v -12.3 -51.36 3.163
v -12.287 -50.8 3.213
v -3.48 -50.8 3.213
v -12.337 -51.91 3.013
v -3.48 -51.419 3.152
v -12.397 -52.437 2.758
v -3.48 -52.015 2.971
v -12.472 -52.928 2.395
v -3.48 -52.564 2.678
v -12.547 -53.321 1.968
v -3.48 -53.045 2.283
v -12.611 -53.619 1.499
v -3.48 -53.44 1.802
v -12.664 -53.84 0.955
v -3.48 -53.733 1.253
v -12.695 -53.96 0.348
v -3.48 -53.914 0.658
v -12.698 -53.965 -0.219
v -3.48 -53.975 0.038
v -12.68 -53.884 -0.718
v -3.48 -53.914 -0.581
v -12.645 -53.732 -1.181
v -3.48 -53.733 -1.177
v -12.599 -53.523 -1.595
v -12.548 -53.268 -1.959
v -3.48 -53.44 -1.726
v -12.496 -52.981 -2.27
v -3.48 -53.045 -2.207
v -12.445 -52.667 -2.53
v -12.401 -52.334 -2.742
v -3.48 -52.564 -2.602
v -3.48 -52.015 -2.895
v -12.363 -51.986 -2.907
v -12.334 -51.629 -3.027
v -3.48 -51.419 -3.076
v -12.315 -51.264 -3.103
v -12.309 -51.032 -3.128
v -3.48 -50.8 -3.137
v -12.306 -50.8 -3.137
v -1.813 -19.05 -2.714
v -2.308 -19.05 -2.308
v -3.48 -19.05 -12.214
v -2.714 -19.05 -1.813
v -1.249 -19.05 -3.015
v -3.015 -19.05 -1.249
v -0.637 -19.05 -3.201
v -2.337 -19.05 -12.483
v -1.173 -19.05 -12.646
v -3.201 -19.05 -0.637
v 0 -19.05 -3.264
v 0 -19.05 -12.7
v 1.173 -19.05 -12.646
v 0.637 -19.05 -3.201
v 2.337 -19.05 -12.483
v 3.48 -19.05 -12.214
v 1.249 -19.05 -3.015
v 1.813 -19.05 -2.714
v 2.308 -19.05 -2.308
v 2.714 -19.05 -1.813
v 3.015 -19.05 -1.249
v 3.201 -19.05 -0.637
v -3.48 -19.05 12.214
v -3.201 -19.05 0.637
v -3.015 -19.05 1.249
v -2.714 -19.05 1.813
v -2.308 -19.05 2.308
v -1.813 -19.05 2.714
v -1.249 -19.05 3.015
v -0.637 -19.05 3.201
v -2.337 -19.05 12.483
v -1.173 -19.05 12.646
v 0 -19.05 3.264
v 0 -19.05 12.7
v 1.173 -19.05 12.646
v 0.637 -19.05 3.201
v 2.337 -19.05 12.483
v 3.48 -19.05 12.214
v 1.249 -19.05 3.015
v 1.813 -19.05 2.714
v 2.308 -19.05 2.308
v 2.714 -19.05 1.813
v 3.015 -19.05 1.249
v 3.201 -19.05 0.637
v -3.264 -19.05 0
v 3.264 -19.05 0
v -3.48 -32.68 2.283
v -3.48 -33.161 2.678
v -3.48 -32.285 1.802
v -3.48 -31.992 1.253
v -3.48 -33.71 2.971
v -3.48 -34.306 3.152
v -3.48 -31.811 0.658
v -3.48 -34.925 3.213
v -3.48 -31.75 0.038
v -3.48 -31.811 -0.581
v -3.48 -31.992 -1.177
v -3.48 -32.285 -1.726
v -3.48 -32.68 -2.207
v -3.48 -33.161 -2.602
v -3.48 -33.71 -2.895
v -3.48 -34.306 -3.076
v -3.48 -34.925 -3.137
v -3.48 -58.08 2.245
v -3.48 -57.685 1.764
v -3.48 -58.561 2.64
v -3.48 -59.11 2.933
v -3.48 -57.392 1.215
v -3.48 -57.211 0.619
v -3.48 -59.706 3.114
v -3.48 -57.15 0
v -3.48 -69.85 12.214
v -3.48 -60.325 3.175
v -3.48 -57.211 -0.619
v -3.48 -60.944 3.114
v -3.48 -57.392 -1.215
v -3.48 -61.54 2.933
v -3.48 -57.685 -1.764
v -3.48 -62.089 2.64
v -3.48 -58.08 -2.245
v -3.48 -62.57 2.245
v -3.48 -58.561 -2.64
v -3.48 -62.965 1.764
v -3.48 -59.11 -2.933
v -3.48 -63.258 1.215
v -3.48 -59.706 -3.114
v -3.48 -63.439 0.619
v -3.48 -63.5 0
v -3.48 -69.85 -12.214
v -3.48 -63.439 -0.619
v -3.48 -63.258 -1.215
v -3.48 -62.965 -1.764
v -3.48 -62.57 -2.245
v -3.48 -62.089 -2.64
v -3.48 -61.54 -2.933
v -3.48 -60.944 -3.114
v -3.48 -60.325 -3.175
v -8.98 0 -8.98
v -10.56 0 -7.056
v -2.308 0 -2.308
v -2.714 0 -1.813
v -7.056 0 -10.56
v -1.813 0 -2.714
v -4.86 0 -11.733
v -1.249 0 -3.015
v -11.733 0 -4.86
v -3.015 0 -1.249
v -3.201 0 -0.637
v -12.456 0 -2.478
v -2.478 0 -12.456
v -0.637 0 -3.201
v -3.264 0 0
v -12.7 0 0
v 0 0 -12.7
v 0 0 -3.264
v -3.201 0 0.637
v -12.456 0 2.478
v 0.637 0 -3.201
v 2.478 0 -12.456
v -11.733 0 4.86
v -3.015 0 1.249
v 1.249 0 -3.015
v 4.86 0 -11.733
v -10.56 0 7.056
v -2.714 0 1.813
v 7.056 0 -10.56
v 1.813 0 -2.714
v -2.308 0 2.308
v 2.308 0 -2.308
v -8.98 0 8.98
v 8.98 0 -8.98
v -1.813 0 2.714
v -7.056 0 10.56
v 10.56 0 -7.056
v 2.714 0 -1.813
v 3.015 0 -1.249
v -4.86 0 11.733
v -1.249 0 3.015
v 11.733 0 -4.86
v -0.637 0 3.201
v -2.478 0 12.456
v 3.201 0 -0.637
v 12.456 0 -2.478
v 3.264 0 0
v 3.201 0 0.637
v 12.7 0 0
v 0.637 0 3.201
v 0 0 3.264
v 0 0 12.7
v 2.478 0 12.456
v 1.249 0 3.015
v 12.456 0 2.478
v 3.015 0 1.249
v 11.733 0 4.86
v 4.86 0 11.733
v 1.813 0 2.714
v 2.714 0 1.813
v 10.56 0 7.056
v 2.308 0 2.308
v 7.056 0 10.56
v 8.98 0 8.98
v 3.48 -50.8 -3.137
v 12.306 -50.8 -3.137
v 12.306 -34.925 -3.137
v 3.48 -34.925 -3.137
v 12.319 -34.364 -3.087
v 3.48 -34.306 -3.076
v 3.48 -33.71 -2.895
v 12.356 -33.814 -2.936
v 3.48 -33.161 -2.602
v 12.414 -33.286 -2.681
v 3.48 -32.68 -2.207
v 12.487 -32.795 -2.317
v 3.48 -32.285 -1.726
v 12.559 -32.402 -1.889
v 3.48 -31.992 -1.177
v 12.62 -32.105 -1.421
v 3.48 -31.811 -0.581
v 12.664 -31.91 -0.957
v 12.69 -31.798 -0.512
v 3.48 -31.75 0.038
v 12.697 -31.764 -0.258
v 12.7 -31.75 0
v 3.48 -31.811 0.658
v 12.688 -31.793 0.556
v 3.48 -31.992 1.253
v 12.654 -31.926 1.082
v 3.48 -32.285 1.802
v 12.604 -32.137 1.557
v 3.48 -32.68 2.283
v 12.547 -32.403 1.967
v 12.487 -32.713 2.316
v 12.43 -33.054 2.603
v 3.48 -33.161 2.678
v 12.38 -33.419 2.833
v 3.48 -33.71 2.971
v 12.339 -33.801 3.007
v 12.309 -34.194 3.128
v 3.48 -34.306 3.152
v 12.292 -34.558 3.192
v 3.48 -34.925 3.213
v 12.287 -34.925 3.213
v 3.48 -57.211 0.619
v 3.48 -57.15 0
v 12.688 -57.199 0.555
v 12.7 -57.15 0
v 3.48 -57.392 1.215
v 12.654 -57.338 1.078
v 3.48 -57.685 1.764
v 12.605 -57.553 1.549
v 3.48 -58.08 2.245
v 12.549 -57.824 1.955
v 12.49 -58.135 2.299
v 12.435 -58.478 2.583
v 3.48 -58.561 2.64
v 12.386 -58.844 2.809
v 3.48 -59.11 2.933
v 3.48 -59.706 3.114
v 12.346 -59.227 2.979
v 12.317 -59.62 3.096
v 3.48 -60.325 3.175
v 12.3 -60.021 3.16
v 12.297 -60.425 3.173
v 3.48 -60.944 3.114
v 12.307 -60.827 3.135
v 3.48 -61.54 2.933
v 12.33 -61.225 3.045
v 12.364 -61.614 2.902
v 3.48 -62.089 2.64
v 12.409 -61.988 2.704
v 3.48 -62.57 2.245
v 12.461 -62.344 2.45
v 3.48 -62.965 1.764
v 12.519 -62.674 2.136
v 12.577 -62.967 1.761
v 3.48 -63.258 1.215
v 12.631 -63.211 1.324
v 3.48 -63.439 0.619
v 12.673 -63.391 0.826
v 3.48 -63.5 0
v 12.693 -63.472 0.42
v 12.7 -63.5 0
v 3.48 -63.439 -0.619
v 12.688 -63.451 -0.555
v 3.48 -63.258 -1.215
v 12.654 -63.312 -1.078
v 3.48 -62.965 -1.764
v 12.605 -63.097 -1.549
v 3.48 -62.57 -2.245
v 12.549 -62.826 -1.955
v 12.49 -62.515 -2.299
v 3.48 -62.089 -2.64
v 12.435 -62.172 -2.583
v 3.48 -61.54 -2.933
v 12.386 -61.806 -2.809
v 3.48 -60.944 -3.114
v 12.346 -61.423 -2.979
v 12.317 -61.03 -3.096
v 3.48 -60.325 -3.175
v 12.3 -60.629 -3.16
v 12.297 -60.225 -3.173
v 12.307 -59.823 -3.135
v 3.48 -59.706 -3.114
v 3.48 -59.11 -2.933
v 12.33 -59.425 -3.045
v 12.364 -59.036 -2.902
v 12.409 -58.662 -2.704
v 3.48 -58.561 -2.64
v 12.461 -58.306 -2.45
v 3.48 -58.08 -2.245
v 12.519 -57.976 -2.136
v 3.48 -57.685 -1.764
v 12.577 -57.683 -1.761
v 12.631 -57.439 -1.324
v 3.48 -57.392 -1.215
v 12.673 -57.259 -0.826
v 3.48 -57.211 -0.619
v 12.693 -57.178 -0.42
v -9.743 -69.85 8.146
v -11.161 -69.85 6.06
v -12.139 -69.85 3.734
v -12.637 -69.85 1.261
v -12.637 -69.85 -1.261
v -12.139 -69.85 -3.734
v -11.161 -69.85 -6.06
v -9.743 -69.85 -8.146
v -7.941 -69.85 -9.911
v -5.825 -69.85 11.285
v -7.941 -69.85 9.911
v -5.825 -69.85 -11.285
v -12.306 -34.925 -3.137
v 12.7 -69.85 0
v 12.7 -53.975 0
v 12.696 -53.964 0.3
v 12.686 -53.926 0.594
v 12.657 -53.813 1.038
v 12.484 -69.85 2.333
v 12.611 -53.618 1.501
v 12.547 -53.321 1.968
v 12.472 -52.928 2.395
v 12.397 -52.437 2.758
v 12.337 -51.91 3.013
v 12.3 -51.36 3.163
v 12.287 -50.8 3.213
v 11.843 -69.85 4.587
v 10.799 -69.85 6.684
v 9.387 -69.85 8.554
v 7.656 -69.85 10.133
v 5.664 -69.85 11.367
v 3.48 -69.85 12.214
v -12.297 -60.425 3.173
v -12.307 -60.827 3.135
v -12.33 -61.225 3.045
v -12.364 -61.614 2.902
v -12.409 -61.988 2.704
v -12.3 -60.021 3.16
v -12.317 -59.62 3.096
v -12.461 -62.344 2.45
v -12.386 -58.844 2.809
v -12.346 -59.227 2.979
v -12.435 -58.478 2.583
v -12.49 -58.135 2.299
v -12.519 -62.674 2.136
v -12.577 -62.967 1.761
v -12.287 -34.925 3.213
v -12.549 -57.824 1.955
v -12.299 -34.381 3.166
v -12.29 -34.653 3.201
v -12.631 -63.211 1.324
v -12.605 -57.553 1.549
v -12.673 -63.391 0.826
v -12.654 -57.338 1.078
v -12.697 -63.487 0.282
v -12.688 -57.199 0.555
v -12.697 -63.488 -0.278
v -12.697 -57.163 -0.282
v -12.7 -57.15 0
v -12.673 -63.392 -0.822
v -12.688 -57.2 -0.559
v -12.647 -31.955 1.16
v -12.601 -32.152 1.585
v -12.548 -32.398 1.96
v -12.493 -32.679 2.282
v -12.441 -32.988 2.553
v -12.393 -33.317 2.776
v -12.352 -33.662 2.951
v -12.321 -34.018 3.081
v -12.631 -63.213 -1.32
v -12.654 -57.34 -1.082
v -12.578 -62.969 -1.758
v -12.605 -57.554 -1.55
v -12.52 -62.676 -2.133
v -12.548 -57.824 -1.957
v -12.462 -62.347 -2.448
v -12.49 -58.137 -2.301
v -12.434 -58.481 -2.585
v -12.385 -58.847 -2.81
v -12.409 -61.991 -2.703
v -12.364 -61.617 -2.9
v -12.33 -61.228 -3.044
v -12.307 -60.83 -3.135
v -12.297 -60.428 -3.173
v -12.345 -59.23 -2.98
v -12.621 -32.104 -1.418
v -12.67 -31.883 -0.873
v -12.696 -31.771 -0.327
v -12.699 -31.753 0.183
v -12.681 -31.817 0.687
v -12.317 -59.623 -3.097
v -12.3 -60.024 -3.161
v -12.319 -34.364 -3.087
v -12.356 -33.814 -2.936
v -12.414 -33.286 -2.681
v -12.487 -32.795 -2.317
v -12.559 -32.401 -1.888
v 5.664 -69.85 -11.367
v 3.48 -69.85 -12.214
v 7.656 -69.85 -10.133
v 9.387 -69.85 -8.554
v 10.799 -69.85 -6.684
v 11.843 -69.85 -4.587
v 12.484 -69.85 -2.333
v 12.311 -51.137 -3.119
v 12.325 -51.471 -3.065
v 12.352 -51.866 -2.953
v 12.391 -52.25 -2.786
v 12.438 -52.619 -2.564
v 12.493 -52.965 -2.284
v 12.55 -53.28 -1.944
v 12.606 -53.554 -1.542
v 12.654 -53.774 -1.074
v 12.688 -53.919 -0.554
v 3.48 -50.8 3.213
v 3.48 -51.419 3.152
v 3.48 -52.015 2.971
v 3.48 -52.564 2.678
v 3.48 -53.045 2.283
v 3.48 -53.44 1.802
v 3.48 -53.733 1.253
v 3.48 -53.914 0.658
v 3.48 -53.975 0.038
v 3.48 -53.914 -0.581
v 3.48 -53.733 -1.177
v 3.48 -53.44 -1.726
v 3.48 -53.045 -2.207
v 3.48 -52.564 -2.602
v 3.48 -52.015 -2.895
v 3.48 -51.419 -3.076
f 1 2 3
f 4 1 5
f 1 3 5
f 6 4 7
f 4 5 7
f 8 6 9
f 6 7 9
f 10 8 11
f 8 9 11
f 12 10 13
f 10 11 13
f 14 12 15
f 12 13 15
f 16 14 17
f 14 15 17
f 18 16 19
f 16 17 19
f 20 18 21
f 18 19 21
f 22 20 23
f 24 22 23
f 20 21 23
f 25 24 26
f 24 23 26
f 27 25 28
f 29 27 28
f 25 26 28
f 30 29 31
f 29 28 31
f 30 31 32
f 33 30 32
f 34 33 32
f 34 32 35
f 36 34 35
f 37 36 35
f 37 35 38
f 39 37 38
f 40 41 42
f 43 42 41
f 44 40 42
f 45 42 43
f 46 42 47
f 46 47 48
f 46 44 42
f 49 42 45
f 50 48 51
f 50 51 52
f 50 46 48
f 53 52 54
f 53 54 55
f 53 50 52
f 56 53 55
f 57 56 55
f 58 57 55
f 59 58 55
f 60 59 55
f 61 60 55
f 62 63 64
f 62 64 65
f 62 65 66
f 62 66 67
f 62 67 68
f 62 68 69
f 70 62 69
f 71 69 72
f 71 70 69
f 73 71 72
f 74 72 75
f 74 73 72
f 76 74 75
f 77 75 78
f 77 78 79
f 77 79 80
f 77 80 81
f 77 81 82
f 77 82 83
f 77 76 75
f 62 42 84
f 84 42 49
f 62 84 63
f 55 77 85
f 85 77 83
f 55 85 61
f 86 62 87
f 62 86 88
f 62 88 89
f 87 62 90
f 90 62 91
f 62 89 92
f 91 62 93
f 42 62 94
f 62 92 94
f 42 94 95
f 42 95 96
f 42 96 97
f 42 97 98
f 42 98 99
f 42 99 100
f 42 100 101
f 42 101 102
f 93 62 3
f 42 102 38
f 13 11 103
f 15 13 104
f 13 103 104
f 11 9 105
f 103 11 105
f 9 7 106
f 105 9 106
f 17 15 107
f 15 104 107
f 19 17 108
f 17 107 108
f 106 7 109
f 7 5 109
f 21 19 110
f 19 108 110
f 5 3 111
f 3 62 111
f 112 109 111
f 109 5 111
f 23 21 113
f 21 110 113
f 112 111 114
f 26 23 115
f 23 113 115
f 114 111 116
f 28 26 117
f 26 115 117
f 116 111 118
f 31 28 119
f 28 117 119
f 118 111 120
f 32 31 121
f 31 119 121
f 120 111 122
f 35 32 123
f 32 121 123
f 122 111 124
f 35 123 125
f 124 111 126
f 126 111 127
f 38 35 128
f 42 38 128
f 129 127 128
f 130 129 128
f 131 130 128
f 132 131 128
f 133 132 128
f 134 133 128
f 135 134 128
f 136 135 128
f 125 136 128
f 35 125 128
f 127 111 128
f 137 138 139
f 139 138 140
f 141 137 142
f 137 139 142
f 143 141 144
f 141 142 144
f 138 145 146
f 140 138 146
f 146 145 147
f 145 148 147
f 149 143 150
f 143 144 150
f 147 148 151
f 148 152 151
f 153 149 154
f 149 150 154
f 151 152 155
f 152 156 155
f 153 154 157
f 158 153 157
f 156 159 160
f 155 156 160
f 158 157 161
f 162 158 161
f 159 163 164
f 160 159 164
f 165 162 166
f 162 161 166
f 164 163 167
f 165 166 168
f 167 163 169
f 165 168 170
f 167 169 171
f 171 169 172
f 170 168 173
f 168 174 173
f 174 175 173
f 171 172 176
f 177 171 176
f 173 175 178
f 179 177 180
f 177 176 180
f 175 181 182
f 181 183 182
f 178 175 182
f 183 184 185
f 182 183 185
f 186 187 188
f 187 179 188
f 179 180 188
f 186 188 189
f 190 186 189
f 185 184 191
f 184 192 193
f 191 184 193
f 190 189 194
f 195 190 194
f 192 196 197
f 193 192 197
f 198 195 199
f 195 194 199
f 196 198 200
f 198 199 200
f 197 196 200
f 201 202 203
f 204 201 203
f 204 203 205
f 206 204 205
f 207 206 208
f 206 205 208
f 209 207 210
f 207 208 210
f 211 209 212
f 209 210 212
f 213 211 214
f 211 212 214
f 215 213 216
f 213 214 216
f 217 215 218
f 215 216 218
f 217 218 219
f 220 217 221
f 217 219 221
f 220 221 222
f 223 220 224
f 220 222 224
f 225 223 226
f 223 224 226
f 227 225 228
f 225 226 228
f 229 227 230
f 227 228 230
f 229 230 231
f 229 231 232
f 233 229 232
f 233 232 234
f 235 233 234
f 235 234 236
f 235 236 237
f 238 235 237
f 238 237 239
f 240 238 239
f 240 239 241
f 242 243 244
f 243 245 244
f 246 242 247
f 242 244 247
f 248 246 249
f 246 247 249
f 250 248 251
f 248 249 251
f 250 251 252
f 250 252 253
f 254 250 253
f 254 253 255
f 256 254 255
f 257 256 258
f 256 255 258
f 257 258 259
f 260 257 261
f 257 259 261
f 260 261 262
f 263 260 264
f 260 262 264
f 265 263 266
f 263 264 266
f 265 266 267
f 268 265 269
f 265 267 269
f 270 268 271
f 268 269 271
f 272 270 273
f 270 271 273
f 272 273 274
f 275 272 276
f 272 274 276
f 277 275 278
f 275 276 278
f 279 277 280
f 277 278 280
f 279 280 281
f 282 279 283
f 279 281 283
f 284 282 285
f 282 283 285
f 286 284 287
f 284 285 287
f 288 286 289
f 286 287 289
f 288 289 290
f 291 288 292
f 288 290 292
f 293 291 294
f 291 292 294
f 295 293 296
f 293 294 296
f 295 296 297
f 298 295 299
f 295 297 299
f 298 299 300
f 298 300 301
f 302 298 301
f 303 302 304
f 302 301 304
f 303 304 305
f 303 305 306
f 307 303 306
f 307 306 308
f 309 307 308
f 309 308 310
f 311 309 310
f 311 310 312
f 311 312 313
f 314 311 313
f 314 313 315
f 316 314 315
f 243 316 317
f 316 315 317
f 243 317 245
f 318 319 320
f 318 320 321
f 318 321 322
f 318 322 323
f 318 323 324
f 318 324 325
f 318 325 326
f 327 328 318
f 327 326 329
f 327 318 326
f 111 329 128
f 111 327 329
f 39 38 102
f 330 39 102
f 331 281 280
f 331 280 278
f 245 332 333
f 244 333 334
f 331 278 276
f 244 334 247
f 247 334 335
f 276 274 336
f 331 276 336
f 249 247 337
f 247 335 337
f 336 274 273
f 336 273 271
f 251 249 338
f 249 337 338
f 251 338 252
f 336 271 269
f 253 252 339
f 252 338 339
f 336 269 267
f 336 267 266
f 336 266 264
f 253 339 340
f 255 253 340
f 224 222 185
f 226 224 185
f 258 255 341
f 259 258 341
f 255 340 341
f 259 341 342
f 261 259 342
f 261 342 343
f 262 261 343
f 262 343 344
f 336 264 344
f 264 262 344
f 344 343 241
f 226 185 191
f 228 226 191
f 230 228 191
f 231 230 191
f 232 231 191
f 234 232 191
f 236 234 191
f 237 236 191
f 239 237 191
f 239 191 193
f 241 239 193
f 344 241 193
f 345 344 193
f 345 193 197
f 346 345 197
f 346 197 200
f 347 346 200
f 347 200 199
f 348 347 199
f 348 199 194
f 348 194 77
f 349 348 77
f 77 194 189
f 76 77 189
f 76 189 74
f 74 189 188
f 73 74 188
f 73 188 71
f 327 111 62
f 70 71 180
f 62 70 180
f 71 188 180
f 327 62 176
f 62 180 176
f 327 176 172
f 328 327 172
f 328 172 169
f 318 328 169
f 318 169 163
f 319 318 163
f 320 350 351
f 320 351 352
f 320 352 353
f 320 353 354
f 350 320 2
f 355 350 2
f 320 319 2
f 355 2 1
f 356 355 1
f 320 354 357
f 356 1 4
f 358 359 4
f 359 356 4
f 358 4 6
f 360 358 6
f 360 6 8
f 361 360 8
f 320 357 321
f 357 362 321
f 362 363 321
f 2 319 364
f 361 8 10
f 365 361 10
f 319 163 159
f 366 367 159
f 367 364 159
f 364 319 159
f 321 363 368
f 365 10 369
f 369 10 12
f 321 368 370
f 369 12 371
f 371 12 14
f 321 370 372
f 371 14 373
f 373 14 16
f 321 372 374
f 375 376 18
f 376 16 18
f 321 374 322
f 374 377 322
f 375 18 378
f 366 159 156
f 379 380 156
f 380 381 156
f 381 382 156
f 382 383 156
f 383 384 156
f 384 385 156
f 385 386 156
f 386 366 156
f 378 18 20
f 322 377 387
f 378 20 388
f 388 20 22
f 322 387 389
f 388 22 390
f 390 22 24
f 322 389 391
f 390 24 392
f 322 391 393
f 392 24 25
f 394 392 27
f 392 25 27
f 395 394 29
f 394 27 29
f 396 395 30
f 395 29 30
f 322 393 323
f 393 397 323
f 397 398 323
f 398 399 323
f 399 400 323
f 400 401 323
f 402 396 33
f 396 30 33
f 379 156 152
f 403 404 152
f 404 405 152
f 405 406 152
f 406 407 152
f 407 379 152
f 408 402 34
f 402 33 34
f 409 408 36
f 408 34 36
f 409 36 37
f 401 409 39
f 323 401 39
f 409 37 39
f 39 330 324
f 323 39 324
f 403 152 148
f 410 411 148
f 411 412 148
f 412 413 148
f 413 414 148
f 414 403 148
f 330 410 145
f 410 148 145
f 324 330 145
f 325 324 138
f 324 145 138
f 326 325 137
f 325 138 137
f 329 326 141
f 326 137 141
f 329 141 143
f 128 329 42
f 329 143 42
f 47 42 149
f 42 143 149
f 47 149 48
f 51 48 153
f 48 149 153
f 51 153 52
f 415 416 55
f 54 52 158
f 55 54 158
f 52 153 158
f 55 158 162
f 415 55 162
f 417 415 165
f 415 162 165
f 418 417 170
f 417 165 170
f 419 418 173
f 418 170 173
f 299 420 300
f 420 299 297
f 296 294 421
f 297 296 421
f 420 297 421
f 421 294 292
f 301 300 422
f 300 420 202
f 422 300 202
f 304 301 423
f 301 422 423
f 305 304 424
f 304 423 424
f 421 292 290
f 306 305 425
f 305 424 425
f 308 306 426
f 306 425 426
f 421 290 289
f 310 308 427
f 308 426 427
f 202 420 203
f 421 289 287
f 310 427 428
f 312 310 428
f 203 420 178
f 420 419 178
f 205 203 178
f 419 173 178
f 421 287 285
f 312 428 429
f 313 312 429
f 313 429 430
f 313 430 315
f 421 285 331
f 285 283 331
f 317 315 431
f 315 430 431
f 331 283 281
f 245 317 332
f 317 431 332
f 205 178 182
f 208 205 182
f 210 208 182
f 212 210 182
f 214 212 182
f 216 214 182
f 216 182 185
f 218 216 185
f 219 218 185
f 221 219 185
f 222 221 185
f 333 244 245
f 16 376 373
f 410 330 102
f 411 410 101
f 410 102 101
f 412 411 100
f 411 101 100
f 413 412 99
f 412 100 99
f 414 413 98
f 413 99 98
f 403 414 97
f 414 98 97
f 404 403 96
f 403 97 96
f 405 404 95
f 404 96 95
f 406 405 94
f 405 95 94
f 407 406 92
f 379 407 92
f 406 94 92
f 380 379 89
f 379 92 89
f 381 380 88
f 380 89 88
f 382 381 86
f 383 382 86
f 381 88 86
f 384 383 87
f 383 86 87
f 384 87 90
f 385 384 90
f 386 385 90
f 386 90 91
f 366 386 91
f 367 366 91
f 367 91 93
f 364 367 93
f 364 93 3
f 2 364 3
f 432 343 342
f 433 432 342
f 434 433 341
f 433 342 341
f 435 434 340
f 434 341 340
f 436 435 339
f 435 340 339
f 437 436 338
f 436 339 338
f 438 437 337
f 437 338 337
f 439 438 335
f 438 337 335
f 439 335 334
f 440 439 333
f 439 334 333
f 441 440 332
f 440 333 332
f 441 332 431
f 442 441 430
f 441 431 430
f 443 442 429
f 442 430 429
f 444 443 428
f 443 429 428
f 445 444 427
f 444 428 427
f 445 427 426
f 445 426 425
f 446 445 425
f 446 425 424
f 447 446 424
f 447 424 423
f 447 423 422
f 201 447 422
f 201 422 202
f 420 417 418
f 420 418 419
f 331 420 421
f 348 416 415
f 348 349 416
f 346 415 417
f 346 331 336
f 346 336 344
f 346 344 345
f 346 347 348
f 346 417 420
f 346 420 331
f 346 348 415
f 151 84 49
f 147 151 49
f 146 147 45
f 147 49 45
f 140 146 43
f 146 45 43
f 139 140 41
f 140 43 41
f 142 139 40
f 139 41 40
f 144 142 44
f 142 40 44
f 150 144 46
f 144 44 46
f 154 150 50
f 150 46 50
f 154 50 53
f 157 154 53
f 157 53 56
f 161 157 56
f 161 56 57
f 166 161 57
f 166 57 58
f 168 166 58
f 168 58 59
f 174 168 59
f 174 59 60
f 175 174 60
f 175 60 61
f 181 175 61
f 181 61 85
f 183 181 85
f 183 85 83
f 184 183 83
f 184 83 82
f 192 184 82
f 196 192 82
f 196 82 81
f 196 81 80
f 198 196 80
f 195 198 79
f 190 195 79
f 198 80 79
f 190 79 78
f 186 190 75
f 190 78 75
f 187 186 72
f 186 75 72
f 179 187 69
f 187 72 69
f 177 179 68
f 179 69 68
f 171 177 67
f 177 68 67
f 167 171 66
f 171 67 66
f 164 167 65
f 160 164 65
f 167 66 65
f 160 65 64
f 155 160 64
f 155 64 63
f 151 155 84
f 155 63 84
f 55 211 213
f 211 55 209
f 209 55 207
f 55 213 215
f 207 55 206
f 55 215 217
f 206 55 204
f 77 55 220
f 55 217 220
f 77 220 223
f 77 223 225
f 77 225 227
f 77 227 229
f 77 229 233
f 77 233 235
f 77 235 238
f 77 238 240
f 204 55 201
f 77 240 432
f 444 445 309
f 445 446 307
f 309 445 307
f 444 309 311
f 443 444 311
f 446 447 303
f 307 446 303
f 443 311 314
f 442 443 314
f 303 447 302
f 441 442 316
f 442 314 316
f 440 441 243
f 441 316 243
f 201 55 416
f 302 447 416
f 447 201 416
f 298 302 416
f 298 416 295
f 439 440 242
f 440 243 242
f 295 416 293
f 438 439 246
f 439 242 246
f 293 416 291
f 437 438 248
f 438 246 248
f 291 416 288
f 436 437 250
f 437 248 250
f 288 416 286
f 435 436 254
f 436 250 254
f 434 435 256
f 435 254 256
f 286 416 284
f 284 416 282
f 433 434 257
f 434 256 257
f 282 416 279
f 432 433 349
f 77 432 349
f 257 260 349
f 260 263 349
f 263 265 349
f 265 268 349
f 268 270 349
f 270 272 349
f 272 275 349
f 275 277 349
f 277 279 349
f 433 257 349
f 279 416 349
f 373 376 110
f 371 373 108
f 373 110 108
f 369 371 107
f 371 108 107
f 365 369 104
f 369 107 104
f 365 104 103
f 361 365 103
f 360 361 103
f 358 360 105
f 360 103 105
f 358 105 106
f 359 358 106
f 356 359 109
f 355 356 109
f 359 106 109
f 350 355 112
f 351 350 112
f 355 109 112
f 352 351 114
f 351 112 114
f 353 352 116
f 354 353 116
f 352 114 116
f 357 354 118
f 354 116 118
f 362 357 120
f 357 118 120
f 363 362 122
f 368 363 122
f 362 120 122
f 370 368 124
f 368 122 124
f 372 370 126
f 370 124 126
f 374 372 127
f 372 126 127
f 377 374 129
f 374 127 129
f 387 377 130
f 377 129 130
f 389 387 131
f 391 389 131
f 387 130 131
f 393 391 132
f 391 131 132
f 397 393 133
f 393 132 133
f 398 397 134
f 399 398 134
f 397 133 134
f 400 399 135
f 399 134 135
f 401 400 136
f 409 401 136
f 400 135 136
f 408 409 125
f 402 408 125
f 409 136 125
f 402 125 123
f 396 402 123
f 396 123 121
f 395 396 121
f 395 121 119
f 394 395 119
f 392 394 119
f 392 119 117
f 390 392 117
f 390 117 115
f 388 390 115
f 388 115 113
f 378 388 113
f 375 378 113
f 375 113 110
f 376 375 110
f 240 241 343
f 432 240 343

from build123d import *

# Parameters (mm, degrees)
F0_R     = 12.7
F1_DEPTH = 69.85
F2_D     = 6.5278
F3_R     = 3.2639
F4_DEPTH = 50.8
F5_R     = 3.175
F6_DEPTH = 12.7
F8_DEPTH = 12.7


with BuildPart() as f1:
    # F0 (on Front) → F1 (new body)
    with BuildSketch(Plane.XZ):
        Circle(F0_R)
    extrude(amount=F1_DEPTH)

    # F2 (through all)
    with Locations(Plane(origin=(0, 0, 0), x_dir=(1, 0, 0), z_dir=(0, 1, 0))):
        with Locations((0, 0)):
            Hole(F2_D / 2)

    # F3 (on face) → F4 (cut)
    with BuildSketch(Plane.XZ.offset(69.85)):
        with BuildLine():
            ThreePointArc((0, 12.7), (-1.7567894036, 12.5779048729), (-3.4798, 12.2139670853))
            Line((-3.4798, 12.2139670853), (-3.4798, -12.2139670853))
            ThreePointArc((-3.4798, -12.2139670853), (-1.7567894036, -12.5779048729), (0, -12.7))
            ThreePointArc((0, -12.7), (1.7567894036, -12.5779048729), (3.4798, -12.2139670853))
            Line((3.4798, -12.2139670853), (3.4798, 12.2139670853))
            ThreePointArc((3.4798, 12.2139670853), (1.7567894036, 12.5779048729), (0, 12.7))
        make_face()
        Circle(F3_R, mode=Mode.SUBTRACT)
    extrude(amount=-F4_DEPTH, mode=Mode.SUBTRACT)

    # F5 (on Right) → F6 (cut, symmetric)
    with BuildSketch(Plane.YZ):
        with Locations((-60.325, 0)):
            Circle(F5_R)
    extrude(amount=F6_DEPTH, both=True, mode=Mode.SUBTRACT)

    # F7 (on Right) → F8 (cut, symmetric)
    with BuildSketch(Plane.YZ):
        with BuildLine():
            Line((-34.925, 3.2131049847), (-50.8, 3.2131049847))
            ThreePointArc((-50.8, 3.2131049847), (-53.975, 0.0381049847), (-50.8, -3.1368950153))
            Line((-50.8, -3.1368950153), (-34.925, -3.1368950153))
            ThreePointArc((-34.925, -3.1368950153), (-31.75, 0.0381049847), (-34.925, 3.2131049847))
        make_face()
    extrude(amount=F8_DEPTH, both=True, mode=Mode.SUBTRACT)


solid = f1.part
